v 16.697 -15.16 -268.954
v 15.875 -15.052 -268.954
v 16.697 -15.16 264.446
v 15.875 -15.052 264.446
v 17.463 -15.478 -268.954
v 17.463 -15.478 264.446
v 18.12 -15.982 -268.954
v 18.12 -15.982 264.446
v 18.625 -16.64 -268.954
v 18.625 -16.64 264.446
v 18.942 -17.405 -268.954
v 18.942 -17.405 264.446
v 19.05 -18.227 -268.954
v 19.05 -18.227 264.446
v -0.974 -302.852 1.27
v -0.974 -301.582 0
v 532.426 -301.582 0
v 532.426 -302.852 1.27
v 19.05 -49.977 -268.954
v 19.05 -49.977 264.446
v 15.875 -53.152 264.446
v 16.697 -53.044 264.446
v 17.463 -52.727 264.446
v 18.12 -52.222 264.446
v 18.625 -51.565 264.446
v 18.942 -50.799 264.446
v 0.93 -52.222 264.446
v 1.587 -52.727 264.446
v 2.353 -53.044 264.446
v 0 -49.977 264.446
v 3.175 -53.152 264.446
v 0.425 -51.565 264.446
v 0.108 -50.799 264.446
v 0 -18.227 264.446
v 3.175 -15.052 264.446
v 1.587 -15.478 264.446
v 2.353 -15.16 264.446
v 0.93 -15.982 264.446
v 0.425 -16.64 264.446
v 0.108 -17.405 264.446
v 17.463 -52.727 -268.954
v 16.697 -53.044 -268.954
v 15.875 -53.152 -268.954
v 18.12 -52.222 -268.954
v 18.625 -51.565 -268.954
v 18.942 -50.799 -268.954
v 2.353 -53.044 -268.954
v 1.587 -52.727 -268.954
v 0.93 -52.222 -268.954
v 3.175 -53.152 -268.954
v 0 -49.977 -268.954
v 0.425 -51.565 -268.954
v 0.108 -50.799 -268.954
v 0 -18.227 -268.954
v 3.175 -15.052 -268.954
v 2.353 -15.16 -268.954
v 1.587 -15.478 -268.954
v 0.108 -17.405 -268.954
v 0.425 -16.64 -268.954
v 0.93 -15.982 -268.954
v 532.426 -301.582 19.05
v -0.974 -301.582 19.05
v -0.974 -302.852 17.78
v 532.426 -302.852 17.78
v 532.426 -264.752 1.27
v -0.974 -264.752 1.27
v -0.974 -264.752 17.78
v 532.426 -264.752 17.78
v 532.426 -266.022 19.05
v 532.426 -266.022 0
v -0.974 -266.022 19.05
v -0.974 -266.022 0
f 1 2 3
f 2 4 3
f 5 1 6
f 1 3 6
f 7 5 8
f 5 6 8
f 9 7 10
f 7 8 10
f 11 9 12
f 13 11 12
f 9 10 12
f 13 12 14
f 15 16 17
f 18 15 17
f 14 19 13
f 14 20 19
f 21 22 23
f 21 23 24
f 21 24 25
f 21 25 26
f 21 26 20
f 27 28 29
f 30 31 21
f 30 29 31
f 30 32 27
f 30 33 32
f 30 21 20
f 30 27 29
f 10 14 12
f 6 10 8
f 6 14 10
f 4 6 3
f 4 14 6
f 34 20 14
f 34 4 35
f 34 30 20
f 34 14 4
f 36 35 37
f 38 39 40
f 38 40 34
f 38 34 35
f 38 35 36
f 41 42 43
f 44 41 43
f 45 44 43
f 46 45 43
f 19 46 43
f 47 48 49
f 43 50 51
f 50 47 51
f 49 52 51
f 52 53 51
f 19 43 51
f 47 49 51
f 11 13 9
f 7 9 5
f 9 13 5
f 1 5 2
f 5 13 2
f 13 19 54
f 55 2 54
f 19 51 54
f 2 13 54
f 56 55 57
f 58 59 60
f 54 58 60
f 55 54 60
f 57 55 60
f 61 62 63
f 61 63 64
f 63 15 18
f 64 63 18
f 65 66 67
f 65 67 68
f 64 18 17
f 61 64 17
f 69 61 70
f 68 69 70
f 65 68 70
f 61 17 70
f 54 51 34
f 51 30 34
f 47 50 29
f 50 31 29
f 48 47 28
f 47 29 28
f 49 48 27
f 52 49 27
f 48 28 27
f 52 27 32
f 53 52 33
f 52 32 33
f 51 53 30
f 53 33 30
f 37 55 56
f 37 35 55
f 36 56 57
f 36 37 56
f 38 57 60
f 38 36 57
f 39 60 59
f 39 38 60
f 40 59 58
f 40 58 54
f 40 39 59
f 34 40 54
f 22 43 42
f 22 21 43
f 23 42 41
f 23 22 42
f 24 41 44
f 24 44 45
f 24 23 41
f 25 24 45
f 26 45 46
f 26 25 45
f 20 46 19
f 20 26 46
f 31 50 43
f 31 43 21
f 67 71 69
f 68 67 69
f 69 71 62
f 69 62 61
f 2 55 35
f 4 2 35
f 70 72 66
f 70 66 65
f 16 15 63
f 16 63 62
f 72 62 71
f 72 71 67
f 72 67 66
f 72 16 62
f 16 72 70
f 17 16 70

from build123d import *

# Parameters (mm, degrees)
F0_W     = 38.1
F0_H     = 533.4
F1_DEPTH = 19.05
F2_R     = 3.175
F3_W     = 533.4
F3_H     = 38.1
F4_DEPTH = 19.05
F5_SIZE  = 1.27


with BuildPart() as f1:
    # F0 (on Right) → F1 (new body)
    with BuildSketch(Plane.YZ):
        with Locations((-34.102181, -2.253657)):
            Rectangle(F0_W, F0_H)
    extrude(amount=F1_DEPTH)

    # F2
    f2_edges = [f1.edges().sort_by_distance(p)[0] for p in [
        (0, -53.152181, -2.253657),
        (19.05, -53.152181, -2.253657),
        (0, -15.052181, -2.253657),
        (19.05, -15.052181, -2.253657),
    ]]
    fillet(f2_edges, radius=F2_R)


with BuildPart() as f4:
    # F3 (on Top) → F4 (new body)
    with BuildSketch(Plane.XY):
        with Locations((265.725854, -283.801692)):
            Rectangle(F3_W, F3_H)
    extrude(amount=F4_DEPTH)

    # F5
    f5_edges = [f4.edges().sort_by_distance(p)[0] for p in [
        (265.725854, -264.751692, 0),
        (265.725854, -264.751692, 19.05),
        (265.725854, -302.851692, 0),
        (265.725854, -302.851692, 19.05),
    ]]
    chamfer(f5_edges, length=F5_SIZE)


solid = Compound([f1.part, f4.part])
